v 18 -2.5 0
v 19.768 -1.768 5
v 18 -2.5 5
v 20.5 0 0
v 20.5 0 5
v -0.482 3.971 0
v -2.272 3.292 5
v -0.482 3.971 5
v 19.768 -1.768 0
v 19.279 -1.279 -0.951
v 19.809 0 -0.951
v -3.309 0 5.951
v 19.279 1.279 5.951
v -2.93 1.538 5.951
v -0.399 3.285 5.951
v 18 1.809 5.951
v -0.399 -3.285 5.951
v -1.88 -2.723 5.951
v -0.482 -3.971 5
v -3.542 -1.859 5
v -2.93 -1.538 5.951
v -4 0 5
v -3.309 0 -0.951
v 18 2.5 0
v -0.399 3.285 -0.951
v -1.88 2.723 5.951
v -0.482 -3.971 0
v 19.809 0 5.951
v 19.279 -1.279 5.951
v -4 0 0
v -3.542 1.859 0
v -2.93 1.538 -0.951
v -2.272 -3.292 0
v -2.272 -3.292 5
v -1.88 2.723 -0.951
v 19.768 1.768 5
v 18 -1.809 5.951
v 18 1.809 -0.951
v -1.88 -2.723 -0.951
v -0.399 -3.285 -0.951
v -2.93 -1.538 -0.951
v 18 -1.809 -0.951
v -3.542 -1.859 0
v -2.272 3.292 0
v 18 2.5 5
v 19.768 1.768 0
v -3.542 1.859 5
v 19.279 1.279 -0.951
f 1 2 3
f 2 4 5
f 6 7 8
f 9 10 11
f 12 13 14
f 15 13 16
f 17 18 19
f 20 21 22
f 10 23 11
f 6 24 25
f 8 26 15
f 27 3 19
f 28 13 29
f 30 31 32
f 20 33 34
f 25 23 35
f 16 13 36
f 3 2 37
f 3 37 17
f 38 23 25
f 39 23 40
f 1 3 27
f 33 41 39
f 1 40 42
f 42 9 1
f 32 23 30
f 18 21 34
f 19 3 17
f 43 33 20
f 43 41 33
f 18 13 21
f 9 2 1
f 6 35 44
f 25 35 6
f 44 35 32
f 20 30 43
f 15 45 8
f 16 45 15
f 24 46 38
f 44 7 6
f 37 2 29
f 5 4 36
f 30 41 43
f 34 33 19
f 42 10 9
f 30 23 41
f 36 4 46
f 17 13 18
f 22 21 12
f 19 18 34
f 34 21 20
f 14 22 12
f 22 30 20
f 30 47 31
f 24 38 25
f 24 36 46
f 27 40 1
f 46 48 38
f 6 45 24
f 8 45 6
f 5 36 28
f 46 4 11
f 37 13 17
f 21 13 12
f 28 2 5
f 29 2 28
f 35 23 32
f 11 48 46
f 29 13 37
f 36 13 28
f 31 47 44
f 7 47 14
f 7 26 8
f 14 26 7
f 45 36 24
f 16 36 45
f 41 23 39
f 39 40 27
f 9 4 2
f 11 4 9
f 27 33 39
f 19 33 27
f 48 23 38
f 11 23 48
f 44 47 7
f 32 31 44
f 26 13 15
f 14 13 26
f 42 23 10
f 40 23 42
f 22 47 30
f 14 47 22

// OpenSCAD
// thing 70494's wing nut: rcyl() is the hull of two coaxial tori (a rounded cylinder), and a wing
// is the hull of two of those side by side — offset(hull(cores), r), every round a real torus.
// (70494's own posts differ in height; that core has a fitted bridge face, whose offset OCCT only
// approximates, so hull() leaves it to the point tier.)
module torus(r, rnd) rotate_extrude() translate([r - rnd / 2, 0, 0]) circle(d = rnd);
module rcyl(r, h, rnd) hull() { torus(r, rnd); translate([0, 0, h - rnd]) torus(r, rnd); }
hull() {
  rcyl(4, 7, 2);
  translate([18, 0, 0]) rcyl(2.5, 7, 2);
}
